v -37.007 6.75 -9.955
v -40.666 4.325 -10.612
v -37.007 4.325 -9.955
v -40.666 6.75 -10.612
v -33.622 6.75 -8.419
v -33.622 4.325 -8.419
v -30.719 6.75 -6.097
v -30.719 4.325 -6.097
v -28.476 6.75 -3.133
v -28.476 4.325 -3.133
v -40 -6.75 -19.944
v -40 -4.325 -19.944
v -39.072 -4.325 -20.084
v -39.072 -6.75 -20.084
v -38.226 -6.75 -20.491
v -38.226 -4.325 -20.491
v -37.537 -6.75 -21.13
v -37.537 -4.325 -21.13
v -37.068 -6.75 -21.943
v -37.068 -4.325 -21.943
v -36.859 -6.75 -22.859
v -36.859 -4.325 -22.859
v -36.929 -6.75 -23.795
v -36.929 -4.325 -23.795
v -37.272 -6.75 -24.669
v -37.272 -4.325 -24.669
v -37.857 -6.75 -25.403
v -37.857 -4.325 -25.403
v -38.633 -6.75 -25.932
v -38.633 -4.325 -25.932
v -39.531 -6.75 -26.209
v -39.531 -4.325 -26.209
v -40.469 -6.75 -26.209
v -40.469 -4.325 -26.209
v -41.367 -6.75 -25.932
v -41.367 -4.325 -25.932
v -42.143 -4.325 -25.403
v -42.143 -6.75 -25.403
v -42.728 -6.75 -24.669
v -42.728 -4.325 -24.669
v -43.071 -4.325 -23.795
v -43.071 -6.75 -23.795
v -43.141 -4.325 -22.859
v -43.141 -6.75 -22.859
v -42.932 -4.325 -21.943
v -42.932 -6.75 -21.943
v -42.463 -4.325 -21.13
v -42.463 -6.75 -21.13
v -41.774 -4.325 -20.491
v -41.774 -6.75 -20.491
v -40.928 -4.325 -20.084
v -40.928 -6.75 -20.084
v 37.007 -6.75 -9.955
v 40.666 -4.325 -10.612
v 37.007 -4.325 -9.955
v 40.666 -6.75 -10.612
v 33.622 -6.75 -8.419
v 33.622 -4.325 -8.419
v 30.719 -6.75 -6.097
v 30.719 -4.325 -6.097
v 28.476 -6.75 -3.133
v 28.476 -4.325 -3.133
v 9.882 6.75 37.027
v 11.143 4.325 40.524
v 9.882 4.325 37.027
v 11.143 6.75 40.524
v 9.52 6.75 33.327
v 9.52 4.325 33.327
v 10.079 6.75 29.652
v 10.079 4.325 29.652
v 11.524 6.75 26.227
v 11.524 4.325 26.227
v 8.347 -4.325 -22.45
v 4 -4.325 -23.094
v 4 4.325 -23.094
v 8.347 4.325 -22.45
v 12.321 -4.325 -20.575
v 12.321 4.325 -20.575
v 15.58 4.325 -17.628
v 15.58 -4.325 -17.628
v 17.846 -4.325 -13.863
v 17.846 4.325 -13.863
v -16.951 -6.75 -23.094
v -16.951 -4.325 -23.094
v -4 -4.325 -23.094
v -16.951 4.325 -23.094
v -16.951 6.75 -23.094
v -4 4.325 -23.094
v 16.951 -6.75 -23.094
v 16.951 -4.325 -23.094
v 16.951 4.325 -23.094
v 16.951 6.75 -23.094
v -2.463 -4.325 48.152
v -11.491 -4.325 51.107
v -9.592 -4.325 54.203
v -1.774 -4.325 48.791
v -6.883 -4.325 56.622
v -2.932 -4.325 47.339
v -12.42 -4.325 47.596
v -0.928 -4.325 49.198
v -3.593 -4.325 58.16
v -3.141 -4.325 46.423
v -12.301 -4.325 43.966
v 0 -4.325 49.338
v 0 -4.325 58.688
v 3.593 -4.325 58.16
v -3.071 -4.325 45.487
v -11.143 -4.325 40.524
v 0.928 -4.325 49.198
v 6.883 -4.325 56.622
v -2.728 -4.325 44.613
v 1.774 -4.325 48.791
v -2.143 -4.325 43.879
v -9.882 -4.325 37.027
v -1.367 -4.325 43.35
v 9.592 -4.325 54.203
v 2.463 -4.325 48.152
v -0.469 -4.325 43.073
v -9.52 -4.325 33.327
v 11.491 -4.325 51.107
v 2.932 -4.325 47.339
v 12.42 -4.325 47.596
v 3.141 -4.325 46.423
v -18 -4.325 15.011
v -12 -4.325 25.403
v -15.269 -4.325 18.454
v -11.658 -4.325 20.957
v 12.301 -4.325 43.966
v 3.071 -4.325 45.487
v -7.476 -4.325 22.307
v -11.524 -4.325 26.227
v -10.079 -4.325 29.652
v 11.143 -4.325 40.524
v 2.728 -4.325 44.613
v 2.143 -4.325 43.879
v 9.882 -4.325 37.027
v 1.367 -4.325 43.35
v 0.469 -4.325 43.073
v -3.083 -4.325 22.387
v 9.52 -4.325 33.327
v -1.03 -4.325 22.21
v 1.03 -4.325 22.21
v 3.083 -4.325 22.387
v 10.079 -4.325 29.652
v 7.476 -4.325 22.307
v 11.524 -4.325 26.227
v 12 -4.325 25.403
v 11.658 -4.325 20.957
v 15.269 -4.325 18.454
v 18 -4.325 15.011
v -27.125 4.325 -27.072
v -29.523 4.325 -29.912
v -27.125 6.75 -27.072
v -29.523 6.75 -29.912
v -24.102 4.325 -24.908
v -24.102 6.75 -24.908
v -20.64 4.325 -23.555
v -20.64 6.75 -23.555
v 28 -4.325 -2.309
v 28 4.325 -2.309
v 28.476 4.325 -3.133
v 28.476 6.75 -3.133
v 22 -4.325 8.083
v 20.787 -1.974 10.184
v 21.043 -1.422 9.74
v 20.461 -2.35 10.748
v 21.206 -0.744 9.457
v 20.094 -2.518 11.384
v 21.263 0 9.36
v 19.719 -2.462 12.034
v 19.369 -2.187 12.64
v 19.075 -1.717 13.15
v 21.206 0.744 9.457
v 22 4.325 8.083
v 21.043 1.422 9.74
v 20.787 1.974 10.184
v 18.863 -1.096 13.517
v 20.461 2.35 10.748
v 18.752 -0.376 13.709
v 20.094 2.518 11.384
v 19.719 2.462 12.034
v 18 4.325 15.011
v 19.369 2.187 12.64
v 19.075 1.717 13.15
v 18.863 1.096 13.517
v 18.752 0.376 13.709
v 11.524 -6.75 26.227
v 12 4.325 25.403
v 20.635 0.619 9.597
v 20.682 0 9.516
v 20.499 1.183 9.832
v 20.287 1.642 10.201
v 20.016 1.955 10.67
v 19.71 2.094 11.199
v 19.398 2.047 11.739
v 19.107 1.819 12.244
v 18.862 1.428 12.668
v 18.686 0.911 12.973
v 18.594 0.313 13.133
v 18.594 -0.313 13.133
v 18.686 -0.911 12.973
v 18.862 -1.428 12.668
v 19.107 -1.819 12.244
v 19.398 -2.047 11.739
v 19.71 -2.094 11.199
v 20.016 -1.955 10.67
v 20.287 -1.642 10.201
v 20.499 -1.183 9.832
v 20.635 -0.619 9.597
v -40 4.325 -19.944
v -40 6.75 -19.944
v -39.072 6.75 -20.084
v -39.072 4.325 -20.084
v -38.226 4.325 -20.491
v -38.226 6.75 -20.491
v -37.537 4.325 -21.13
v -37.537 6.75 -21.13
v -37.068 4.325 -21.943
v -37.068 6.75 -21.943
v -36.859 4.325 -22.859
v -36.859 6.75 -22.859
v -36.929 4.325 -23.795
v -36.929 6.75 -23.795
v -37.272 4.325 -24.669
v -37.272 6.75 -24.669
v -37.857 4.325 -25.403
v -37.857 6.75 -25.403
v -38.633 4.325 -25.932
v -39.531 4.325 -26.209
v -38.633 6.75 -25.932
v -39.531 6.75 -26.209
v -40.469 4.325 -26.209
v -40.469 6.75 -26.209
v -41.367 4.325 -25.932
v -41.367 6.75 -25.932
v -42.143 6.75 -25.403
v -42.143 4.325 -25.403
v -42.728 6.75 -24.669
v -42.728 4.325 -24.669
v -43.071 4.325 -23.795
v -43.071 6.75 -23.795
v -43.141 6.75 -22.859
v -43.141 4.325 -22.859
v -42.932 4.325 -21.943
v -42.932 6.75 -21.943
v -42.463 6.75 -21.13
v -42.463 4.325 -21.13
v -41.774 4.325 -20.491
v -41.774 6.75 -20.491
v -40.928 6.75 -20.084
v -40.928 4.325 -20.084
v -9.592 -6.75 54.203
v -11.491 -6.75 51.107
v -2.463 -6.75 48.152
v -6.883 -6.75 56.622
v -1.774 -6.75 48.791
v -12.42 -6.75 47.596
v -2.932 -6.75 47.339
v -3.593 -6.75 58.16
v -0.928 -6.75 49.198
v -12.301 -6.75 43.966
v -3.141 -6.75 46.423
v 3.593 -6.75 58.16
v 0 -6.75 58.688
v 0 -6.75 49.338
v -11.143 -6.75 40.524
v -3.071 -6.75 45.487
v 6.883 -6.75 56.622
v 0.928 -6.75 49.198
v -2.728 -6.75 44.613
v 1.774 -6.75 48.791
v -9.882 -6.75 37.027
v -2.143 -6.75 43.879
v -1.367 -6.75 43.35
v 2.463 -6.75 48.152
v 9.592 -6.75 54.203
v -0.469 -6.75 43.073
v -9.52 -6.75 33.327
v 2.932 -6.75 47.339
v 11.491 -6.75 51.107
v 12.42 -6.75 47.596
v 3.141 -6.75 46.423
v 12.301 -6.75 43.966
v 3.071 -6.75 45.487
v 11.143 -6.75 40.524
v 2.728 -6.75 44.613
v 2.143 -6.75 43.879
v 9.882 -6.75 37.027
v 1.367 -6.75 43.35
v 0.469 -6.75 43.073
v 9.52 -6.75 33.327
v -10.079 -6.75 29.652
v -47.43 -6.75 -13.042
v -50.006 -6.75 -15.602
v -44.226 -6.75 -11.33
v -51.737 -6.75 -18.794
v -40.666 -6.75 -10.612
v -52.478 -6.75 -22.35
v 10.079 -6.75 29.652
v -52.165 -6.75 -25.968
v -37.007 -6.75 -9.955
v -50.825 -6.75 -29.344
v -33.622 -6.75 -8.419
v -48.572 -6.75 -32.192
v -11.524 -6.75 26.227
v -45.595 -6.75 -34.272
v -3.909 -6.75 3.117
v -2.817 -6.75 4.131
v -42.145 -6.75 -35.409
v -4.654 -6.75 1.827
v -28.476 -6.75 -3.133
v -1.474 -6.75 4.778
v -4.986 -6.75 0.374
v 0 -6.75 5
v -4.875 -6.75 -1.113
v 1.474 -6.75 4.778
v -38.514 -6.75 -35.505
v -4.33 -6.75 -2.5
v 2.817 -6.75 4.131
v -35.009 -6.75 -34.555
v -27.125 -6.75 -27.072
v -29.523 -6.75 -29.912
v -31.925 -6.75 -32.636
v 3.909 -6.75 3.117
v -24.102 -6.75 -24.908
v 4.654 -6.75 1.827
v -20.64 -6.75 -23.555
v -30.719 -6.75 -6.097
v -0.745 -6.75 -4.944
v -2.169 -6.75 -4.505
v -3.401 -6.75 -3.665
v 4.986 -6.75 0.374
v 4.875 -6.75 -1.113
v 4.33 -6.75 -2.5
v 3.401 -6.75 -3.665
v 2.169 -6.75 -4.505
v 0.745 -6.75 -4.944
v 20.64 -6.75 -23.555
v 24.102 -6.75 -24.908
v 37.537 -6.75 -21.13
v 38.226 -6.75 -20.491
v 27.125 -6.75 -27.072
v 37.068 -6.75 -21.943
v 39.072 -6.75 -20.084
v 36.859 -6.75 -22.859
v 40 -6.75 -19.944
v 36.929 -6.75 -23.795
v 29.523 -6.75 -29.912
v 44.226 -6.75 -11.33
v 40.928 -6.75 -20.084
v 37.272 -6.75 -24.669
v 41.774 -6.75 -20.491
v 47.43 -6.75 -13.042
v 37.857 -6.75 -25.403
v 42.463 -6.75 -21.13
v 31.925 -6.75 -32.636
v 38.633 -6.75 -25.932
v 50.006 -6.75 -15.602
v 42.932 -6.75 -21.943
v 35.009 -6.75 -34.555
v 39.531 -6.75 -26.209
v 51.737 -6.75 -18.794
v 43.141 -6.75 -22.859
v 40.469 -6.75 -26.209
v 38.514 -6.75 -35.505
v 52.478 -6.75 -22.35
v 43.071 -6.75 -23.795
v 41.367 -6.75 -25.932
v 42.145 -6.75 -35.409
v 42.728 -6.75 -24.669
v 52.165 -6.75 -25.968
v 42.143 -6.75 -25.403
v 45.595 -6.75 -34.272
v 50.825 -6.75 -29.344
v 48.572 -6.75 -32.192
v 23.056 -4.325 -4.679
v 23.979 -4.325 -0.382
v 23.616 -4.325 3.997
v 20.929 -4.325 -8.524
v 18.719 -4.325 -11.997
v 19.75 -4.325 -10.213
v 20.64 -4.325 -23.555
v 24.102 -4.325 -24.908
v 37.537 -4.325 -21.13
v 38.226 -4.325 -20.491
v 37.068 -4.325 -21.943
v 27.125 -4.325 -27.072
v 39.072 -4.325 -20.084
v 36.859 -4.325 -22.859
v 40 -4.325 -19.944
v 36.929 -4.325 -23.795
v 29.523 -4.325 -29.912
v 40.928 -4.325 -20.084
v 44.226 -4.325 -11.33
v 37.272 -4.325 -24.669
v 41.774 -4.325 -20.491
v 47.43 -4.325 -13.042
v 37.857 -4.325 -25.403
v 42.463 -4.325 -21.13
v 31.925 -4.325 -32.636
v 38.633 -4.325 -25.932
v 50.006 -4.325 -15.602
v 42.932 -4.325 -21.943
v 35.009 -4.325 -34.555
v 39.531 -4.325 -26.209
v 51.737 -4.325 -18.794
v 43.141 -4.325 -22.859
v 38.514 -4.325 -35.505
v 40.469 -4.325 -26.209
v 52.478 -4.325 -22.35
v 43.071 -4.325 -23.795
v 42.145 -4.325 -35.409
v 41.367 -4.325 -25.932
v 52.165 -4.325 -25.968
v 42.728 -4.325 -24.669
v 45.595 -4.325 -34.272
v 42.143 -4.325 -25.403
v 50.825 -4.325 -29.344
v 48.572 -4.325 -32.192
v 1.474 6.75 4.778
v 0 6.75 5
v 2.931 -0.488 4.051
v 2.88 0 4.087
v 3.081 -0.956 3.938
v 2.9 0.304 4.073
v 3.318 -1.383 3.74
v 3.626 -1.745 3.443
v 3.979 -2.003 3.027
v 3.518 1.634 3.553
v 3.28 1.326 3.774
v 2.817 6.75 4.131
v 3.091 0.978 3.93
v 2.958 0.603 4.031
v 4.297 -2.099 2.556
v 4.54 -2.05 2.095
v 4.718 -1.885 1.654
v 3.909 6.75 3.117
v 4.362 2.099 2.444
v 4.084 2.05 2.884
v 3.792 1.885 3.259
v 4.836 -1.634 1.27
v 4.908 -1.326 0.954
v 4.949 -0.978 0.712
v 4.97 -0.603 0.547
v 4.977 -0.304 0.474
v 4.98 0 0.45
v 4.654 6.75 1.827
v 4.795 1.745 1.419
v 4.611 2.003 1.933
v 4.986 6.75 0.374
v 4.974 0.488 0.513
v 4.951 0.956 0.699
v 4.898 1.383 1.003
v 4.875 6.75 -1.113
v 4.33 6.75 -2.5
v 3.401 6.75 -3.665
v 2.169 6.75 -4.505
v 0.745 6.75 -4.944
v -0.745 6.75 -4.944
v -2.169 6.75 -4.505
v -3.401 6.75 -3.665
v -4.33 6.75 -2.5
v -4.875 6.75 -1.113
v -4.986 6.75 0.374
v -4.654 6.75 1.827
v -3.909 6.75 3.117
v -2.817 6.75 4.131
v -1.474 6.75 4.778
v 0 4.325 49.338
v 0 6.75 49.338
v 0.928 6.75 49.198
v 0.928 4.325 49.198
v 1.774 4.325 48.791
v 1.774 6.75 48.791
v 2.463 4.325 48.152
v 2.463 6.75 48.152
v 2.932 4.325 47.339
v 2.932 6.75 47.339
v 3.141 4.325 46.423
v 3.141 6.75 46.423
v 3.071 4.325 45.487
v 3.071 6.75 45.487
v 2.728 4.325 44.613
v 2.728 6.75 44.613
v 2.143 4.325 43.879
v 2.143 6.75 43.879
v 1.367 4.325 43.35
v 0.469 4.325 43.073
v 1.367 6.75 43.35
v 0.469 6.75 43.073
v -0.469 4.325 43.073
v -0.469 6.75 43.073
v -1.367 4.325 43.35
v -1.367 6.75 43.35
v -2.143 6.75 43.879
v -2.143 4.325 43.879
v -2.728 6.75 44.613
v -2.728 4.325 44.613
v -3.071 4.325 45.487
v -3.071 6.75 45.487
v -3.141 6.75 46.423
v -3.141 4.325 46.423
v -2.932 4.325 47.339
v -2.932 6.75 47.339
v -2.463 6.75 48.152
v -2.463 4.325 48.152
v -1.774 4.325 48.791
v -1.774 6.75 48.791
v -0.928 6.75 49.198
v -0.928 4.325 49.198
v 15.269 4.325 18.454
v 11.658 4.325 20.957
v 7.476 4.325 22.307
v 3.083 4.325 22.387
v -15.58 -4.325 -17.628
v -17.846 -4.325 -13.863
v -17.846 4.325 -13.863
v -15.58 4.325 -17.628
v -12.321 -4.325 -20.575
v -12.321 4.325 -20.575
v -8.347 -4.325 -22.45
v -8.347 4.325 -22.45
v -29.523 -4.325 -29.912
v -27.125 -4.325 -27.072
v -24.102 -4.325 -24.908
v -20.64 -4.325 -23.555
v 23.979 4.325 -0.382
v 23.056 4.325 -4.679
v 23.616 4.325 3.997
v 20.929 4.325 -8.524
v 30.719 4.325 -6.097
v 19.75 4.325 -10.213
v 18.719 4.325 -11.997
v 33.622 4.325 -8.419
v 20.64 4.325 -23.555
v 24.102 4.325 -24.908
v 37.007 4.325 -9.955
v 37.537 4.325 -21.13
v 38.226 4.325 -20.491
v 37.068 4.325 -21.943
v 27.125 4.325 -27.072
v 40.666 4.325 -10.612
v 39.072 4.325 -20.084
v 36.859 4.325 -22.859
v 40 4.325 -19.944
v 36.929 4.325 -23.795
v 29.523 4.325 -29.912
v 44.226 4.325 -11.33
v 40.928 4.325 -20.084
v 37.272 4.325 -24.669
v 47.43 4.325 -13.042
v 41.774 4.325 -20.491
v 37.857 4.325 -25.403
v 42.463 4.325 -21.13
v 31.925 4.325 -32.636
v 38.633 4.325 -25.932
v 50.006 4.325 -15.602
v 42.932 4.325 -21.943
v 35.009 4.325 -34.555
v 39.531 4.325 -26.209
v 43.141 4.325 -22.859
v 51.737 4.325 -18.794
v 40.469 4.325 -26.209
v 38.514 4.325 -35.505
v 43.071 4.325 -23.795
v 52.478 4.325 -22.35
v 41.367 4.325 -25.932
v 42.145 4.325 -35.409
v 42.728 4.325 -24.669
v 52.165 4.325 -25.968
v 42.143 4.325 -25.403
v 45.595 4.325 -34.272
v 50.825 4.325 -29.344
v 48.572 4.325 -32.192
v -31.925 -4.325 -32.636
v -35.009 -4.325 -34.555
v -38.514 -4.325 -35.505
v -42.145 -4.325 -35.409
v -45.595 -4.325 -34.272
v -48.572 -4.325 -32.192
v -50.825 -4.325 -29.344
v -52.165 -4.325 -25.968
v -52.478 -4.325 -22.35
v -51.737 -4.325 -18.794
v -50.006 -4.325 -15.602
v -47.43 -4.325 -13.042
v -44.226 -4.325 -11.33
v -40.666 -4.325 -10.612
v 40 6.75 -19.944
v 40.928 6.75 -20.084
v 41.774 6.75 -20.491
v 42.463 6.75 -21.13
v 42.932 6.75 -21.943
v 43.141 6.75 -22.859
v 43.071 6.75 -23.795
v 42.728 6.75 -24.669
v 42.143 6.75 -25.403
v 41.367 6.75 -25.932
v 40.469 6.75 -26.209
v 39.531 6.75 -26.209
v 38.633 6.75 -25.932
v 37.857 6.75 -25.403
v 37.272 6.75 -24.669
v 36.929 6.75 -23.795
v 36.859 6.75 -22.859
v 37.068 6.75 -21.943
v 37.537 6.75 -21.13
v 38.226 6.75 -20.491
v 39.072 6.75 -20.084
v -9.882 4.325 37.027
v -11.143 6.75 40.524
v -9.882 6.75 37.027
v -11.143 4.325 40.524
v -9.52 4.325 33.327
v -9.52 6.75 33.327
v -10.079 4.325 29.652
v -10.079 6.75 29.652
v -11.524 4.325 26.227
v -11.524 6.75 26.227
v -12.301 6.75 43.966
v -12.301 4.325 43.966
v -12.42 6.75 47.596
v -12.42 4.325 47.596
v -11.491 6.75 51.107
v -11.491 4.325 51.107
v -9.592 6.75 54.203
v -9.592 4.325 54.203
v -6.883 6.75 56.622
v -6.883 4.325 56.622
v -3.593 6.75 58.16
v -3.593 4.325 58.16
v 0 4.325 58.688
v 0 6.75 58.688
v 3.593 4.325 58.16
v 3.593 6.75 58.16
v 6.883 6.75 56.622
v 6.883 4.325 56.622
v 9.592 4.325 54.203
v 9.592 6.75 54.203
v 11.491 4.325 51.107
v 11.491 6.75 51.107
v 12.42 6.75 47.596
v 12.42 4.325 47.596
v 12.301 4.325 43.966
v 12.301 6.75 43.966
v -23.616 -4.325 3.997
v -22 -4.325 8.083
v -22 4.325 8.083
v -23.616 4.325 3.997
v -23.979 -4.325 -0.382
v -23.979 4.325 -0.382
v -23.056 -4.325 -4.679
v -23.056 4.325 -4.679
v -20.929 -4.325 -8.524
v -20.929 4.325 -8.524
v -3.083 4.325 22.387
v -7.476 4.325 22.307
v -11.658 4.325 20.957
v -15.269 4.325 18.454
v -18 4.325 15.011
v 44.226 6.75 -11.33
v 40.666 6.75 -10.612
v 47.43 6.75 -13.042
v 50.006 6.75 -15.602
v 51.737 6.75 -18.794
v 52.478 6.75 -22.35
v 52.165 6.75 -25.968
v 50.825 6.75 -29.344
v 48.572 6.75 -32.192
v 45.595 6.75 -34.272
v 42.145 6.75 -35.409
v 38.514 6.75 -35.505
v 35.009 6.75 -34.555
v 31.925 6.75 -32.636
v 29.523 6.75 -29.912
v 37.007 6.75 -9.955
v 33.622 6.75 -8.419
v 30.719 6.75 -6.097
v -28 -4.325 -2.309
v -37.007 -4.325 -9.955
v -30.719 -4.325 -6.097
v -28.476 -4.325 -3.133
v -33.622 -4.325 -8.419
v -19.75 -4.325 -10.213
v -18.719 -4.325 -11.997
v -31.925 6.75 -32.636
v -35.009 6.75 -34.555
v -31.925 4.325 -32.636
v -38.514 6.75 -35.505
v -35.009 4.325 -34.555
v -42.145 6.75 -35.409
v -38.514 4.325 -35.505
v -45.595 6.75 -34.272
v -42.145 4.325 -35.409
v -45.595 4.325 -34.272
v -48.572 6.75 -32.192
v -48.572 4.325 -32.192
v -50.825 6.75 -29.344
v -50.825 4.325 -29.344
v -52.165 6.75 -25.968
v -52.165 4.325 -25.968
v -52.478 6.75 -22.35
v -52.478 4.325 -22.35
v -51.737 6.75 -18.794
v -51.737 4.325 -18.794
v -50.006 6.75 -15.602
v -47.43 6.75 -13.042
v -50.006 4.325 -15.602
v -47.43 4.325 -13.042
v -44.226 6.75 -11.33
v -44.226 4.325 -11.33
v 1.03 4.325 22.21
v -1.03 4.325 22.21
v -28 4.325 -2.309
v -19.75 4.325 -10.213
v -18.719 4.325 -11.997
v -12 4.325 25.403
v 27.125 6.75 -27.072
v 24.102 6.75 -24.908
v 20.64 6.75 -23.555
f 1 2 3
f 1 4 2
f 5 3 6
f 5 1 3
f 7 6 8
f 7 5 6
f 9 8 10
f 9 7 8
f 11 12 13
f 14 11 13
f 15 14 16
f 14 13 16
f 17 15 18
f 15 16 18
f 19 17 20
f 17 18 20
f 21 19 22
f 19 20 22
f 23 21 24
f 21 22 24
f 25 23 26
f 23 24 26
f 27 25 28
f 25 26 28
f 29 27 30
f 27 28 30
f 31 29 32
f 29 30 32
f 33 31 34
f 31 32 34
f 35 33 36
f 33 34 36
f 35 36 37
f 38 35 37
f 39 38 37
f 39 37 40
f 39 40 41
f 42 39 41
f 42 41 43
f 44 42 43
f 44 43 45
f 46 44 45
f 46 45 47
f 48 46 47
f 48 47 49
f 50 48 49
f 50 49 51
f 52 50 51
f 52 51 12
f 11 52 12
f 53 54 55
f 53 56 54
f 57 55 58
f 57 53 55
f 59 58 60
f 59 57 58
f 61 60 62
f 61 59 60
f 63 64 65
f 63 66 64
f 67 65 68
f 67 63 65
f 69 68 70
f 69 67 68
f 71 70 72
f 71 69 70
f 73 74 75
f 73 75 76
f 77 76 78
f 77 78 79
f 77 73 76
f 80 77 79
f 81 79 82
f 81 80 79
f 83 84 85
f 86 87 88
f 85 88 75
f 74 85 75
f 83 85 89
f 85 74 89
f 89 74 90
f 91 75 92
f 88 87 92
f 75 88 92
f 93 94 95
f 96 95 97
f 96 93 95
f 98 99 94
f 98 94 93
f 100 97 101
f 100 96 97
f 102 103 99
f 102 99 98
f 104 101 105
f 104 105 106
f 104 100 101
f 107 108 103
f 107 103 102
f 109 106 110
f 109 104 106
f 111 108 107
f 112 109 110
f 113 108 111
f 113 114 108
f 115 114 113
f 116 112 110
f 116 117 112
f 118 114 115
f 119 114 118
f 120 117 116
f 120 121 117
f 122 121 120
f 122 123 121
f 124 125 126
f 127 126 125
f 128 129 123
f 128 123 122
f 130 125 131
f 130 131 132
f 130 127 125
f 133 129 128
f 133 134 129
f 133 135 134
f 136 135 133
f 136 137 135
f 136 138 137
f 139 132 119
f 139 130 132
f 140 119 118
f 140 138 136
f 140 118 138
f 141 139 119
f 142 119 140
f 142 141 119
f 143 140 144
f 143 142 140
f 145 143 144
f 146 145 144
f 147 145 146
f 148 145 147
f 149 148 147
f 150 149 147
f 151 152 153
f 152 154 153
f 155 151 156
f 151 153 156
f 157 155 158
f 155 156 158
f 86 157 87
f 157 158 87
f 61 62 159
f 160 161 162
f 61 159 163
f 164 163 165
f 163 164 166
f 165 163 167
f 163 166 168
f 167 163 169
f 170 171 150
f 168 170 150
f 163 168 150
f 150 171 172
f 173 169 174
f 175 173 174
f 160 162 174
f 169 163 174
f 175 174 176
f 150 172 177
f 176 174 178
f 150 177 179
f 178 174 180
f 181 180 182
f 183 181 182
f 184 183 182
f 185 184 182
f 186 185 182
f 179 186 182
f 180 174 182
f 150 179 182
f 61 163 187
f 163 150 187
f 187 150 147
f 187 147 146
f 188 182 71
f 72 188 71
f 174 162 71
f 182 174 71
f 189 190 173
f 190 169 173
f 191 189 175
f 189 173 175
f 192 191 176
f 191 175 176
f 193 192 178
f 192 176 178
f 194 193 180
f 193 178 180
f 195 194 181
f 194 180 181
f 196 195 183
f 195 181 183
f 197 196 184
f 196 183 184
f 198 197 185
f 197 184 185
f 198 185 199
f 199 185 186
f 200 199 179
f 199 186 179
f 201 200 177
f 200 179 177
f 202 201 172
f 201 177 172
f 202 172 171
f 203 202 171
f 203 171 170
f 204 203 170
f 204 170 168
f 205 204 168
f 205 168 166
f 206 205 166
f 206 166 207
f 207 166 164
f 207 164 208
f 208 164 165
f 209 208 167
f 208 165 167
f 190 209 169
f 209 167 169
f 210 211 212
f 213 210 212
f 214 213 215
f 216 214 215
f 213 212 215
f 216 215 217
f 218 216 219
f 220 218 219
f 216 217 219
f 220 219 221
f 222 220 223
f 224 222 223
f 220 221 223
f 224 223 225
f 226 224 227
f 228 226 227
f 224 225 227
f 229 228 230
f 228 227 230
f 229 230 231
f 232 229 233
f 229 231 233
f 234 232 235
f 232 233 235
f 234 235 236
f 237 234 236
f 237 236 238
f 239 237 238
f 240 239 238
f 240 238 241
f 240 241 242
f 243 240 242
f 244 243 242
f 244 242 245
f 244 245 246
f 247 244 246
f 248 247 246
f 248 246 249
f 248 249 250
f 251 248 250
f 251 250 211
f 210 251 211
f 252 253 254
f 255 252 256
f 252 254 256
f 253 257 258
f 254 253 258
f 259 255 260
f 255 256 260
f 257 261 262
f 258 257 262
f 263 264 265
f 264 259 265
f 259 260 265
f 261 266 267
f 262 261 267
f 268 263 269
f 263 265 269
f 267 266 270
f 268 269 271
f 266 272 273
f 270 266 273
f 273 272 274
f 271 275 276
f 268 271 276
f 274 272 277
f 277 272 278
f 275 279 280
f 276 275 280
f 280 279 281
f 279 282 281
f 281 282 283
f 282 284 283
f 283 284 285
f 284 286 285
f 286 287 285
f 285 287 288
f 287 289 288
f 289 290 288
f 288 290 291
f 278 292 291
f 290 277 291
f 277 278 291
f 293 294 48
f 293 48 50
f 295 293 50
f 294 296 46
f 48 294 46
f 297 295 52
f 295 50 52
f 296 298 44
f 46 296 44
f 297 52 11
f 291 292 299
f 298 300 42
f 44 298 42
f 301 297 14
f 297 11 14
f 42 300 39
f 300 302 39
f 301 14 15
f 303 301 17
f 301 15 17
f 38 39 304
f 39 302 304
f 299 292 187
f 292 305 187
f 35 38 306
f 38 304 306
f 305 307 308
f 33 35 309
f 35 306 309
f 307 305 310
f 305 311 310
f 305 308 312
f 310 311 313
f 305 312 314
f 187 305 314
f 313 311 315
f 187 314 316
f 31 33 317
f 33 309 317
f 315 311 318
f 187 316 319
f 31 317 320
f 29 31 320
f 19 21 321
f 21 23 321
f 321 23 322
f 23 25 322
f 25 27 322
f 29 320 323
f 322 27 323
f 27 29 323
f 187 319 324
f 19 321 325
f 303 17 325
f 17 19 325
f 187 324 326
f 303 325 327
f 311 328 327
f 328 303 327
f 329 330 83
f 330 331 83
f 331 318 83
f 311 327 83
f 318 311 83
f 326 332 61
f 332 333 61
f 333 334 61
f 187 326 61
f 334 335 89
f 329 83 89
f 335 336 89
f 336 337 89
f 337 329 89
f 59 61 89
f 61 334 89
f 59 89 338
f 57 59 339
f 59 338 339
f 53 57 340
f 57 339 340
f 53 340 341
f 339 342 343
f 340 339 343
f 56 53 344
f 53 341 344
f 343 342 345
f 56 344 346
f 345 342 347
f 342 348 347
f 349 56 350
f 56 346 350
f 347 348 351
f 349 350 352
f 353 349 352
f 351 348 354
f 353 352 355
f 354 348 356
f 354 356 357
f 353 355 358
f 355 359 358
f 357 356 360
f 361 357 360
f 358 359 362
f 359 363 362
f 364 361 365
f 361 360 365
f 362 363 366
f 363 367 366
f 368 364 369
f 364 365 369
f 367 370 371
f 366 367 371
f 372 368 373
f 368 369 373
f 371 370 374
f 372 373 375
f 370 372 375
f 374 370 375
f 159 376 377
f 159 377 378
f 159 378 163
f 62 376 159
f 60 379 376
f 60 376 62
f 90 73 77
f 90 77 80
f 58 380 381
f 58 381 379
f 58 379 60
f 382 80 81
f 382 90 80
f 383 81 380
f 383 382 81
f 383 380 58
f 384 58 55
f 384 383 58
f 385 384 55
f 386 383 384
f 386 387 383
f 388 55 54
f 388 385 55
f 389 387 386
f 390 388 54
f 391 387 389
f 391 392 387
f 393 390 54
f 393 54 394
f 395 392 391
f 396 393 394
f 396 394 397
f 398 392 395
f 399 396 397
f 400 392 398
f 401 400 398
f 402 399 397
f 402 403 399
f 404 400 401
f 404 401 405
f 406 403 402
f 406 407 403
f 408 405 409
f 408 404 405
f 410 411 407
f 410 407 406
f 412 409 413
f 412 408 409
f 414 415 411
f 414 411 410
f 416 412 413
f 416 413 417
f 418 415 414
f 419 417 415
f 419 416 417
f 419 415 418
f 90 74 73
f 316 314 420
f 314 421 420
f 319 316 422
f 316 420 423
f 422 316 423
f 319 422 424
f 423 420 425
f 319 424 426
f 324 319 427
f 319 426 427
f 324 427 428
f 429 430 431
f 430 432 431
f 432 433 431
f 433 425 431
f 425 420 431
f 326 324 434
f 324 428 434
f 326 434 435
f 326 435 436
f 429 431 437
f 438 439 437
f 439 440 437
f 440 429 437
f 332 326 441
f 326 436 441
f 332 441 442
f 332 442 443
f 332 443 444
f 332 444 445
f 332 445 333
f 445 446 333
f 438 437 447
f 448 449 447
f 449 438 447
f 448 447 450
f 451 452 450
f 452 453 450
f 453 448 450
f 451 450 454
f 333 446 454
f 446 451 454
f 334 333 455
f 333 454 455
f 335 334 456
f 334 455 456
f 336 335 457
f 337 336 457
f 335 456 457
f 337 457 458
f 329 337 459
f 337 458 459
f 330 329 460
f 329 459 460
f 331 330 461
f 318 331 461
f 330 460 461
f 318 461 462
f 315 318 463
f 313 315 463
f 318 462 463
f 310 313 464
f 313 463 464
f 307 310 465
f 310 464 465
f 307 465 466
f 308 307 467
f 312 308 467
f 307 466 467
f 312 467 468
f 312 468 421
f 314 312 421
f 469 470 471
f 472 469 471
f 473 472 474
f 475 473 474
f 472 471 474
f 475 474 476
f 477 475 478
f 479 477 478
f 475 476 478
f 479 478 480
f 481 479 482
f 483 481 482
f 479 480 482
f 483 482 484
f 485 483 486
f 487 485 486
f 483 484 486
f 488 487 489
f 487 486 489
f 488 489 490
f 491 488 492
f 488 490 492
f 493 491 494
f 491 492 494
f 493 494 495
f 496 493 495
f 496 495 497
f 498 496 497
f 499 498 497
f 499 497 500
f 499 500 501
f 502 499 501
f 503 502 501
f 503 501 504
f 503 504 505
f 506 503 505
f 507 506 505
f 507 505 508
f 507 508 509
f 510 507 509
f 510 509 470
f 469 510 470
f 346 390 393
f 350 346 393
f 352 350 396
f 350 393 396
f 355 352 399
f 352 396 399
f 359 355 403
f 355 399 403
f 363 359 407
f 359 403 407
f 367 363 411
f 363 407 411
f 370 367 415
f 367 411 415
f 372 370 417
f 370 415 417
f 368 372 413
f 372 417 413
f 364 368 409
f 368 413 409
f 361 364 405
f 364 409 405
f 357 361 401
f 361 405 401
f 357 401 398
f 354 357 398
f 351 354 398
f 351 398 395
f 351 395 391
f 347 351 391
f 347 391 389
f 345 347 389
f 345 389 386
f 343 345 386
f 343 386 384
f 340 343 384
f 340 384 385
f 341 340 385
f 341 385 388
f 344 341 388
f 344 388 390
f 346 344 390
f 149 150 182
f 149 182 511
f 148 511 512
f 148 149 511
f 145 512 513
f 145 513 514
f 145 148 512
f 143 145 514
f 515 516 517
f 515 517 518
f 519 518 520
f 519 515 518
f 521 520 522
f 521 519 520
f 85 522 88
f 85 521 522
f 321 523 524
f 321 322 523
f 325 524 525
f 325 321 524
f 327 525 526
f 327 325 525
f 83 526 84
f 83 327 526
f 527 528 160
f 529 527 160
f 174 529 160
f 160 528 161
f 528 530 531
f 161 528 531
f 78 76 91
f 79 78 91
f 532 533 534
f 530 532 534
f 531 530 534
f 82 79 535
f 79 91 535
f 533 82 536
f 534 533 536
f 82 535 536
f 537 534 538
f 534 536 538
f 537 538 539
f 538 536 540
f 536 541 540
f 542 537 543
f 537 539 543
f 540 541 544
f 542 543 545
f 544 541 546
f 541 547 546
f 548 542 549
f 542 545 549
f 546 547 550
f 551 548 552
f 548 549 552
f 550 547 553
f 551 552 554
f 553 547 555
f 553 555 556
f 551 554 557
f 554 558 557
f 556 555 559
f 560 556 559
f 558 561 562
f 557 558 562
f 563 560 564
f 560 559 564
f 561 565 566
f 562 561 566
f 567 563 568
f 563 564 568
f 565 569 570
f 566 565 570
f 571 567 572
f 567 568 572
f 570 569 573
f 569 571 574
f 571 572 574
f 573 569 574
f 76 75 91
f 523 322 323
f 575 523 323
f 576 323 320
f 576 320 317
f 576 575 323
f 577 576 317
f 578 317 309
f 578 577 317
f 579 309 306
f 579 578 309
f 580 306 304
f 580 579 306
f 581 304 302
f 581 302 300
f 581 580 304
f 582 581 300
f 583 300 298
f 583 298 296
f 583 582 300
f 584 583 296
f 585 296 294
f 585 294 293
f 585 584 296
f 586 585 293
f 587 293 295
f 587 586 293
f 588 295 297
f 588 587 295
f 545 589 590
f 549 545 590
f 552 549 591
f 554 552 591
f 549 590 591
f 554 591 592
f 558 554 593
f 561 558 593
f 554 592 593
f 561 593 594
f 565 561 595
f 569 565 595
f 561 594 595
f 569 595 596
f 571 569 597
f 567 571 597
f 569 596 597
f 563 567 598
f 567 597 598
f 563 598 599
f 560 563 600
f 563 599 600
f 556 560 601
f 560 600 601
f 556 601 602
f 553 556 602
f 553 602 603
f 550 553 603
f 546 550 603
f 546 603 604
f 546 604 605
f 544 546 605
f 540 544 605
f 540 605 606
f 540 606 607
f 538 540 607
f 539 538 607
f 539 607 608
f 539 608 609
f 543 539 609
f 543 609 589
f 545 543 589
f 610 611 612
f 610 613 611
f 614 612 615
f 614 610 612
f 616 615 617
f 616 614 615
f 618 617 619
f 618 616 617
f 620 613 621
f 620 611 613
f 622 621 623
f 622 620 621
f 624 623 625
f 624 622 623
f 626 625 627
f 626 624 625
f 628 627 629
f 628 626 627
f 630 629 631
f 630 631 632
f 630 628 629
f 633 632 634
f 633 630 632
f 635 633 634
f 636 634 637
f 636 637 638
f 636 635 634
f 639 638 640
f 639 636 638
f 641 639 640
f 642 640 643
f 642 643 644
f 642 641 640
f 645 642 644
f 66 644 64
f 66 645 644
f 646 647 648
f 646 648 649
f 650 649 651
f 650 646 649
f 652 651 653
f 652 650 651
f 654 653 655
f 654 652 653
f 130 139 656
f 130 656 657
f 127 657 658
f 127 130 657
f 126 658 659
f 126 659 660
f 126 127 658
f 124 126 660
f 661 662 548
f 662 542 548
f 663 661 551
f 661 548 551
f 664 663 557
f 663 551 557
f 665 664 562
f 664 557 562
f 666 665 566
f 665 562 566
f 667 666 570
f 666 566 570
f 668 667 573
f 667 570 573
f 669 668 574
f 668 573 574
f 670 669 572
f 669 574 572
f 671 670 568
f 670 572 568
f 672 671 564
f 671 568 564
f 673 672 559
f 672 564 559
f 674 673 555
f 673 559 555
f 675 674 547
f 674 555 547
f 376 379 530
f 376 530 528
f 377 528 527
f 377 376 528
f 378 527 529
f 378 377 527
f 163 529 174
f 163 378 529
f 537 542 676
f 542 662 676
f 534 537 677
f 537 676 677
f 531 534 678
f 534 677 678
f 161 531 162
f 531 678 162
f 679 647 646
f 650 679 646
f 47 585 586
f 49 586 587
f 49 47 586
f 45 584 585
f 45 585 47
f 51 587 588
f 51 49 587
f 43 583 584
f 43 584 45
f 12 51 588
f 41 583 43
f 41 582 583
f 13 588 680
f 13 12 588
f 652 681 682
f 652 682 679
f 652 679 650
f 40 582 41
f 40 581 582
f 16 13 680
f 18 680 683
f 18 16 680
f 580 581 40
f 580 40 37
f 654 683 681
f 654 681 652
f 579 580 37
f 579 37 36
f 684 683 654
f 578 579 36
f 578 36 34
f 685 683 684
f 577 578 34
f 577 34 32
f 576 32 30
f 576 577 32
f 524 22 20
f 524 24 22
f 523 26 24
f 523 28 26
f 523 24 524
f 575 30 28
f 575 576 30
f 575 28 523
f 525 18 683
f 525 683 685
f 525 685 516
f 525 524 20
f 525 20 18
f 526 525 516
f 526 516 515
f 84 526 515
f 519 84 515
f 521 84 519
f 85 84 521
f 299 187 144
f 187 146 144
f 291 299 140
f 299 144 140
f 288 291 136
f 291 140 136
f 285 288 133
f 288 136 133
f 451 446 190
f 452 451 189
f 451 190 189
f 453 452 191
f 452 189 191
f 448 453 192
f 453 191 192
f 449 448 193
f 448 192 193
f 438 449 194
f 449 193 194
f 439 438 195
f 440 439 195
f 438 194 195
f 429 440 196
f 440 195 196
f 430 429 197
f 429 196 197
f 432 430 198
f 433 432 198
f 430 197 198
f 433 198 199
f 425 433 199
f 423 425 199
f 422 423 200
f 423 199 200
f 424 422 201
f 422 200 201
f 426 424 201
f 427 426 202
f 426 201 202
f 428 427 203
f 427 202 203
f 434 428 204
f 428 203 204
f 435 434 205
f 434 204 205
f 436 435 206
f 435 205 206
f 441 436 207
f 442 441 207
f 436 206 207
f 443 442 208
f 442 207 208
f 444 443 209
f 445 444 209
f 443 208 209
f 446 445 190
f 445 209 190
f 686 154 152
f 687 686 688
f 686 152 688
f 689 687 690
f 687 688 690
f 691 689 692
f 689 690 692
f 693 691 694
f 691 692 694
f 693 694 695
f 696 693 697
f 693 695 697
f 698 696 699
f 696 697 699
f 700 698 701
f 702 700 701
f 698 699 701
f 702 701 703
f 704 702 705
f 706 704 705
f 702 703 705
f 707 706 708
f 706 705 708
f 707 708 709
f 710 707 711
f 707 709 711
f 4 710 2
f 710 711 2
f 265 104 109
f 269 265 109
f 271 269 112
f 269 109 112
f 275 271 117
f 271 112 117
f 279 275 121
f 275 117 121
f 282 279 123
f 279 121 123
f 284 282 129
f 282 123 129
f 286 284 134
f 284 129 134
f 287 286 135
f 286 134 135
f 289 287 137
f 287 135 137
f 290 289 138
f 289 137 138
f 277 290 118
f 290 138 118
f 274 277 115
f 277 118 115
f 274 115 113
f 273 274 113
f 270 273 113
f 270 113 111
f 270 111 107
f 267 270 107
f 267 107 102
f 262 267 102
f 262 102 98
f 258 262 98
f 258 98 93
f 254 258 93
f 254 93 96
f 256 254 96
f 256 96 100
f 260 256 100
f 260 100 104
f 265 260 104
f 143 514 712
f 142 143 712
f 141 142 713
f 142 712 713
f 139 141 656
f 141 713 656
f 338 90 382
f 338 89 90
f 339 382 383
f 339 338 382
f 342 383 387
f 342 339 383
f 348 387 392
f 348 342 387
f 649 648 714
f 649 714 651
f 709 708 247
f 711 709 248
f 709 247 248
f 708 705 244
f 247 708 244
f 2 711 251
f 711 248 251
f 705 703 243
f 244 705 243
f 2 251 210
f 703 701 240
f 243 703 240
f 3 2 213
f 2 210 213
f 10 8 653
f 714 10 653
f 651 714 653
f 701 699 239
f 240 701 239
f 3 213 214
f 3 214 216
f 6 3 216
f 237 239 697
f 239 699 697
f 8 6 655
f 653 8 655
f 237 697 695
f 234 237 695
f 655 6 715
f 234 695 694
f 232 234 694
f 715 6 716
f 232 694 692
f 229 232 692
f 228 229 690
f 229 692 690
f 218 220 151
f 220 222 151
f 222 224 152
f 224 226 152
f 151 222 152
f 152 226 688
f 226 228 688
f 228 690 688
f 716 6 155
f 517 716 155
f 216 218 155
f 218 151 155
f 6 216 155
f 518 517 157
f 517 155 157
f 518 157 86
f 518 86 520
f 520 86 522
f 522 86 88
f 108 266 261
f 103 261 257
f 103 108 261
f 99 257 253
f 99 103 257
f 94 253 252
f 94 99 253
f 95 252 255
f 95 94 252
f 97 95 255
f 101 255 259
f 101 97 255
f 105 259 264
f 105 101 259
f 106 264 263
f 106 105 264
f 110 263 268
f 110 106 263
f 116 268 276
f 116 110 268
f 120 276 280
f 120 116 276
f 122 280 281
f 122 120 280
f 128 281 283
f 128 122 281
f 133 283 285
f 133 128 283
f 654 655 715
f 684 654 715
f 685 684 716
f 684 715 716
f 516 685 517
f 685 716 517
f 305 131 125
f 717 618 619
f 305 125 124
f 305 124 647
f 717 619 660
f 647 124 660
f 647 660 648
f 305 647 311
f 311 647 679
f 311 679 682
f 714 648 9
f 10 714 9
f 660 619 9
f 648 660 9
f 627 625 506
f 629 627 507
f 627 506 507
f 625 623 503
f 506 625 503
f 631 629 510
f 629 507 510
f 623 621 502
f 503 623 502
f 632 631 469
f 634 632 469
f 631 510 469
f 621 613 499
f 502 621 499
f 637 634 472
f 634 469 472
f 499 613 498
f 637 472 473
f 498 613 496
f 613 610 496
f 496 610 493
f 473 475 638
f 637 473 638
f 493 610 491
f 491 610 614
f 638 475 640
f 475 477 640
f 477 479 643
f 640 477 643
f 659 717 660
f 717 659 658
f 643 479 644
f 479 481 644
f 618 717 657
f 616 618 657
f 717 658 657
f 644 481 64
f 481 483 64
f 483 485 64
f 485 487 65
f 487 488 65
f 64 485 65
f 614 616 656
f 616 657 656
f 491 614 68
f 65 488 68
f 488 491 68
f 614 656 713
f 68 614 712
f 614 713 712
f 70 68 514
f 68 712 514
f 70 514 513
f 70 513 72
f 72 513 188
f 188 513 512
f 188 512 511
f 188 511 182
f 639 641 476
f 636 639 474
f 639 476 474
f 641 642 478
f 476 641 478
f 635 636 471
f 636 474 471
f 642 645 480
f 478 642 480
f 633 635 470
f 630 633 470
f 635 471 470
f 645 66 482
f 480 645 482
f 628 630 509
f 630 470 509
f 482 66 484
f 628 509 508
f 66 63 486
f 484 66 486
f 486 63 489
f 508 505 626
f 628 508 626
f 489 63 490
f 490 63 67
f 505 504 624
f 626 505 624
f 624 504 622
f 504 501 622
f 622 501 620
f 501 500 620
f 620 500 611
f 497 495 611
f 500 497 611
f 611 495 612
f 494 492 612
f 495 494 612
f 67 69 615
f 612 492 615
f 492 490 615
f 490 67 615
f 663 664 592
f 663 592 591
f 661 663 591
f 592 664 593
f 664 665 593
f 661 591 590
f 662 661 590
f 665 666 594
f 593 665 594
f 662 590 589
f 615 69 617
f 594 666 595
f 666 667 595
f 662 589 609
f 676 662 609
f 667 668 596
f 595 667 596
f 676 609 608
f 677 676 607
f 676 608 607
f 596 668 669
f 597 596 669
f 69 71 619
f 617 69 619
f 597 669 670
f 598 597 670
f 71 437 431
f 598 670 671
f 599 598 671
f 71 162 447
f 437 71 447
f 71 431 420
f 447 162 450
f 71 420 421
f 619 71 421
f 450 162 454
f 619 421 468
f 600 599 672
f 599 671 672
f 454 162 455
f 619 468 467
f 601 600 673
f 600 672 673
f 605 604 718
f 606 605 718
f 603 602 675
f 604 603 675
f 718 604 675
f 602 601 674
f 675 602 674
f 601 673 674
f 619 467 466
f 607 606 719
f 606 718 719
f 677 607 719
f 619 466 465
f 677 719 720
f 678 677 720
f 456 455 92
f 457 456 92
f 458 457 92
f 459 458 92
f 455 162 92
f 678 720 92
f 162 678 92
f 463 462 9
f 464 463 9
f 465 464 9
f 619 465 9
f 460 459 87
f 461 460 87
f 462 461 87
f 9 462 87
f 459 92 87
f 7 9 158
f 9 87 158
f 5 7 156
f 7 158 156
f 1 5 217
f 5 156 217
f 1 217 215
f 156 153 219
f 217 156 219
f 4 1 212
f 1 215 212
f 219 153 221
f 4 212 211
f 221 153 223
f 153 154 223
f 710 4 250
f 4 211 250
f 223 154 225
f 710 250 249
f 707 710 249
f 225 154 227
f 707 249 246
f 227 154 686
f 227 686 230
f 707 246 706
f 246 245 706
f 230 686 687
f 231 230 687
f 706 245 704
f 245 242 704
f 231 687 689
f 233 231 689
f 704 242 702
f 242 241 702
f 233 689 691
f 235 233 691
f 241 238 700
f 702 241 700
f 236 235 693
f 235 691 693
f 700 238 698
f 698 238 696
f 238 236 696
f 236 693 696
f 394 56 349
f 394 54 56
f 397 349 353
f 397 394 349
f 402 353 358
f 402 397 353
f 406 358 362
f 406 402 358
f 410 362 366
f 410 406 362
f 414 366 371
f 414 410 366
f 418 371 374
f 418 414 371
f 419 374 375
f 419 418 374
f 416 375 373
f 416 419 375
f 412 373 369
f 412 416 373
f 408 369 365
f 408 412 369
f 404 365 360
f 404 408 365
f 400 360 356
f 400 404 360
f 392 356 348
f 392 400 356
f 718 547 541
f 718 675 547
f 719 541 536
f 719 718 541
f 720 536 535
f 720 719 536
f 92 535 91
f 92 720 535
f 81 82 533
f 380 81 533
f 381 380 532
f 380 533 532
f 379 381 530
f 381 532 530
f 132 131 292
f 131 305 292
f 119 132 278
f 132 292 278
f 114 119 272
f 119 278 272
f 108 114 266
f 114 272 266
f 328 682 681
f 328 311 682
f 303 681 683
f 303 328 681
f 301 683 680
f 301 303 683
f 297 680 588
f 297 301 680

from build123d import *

# Parameters (mm, degrees)
ESQUISSE1_R             = 12.5
ESQUISSE1_R_2           = 5
BOSS_EXTRU_1_DEPTH      = 6.75
ESQUISSE7_R             = 24
ENL_V_MAT_EXTRU_1_DEPTH = 4.325
CONG_6_START            = -4.325
CONG_6_DEPTH            = 8.65
CONG_7_R                = 15
ESQUISSE25_R            = 3.15
ENL_V_MAT_EXTRU_2_DEPTH = 80.892326756


with BuildPart() as part:
    # Esquisse1 → Boss.-Extru.1 (new, symmetric)
    # profile 1 of 16: a face of its own
    with BuildSketch(Plane(origin=(0, 0, 0), x_dir=(1, 0, 0), z_dir=(0, 1, 0))):
        with Locations((-40, 23.094010768)):
            Circle(ESQUISSE1_R)
    # profile 2 of 16: a face of its own
    with BuildSketch(Plane(origin=(0, 0, 0), x_dir=(1, 0, 0), z_dir=(0, 1, 0))):
        with Locations((0, -46.188021535)):
            Circle(ESQUISSE1_R)
    # profile 3 of 16: a face of its own
    with BuildSketch(Plane(origin=(0, 0, 0), x_dir=(1, 0, 0), z_dir=(0, 1, 0))):
        with Locations((40, 23.094010768)):
            Circle(ESQUISSE1_R)
    # profile 4 of 16: a face of its own
    with BuildSketch(Plane(origin=(0, 0, 0), x_dir=(1, 0, 0), z_dir=(0, 1, 0))):
        Polygon((0, -46.188021535), (-40, 23.094010768), (40, 23.094010768), align=None)
        with Locations(Location((0, 0, 0), (0, 0, 270))):
            Circle(ESQUISSE1_R_2, mode=Mode.SUBTRACT)
    # profile 5 of 16: a face of its own
    with BuildSketch(Plane(origin=(0, 0, 0), x_dir=(1, 0, 0), z_dir=(0, 1, 0))):
        with BuildLine():
            ThreePointArc((-33.75, 12.26869322), (-29.174682453, 16.844010768), (-27.5, 23.094010768))
            Line((-27.5, 23.094010768), (-40, 23.094010768))
            Line((-40, 23.094010768), (-33.75, 12.26869322))
        make_face()
    # profile 6 of 16: a face of its own
    with BuildSketch(Plane(origin=(0, 0, 0), x_dir=(1, 0, 0), z_dir=(0, 1, 0))):
        with BuildLine():
            Line((-40, 23.094010768), (-27.5, 23.094010768))
            ThreePointArc((-27.5, 23.094010768), (-50.825317547, 29.344010768), (-33.75, 12.26869322))
            Line((-33.75, 12.26869322), (-40, 23.094010768))
        make_face()
    # profile 7 of 16: a face of its own
    with BuildSketch(Plane(origin=(0, 0, 0), x_dir=(1, 0, 0), z_dir=(0, 1, 0))):
        with BuildLine():
            Line((27.5, 23.094010768), (40, 23.094010768))
            Line((40, 23.094010768), (33.75, 12.26869322))
            ThreePointArc((33.75, 12.26869322), (46.25, 12.26869322), (52.5, 23.094010768))
            ThreePointArc((52.5, 23.094010768), (40, 35.594010768), (27.5, 23.094010768))
        make_face()
    # profile 8 of 16: a face of its own
    with BuildSketch(Plane(origin=(0, 0, 0), x_dir=(1, 0, 0), z_dir=(0, 1, 0))):
        with BuildLine():
            Line((33.75, 12.26869322), (40, 23.094010768))
            Line((40, 23.094010768), (27.5, 23.094010768))
            ThreePointArc((27.5, 23.094010768), (29.174682453, 16.844010768), (33.75, 12.26869322))
        make_face()
    # profile 9 of 16: a face of its own
    with BuildSketch(Plane(origin=(0, 0, 0), x_dir=(1, 0, 0), z_dir=(0, 1, 0))):
        with BuildLine():
            Line((27.5, 23.094010768), (40, 23.094010768))
            Line((40, 23.094010768), (33.75, 12.26869322))
            ThreePointArc((33.75, 12.26869322), (46.25, 12.26869322), (52.5, 23.094010768))
            ThreePointArc((52.5, 23.094010768), (40, 35.594010768), (27.5, 23.094010768))
        make_face()
    # profile 10 of 16: a face of its own
    with BuildSketch(Plane(origin=(0, 0, 0), x_dir=(1, 0, 0), z_dir=(0, 1, 0))):
        with BuildLine():
            Line((33.75, 12.26869322), (40, 23.094010768))
            Line((40, 23.094010768), (27.5, 23.094010768))
            ThreePointArc((27.5, 23.094010768), (29.174682453, 16.844010768), (33.75, 12.26869322))
        make_face()
    # profile 11 of 16: a face of its own
    with BuildSketch(Plane(origin=(0, 0, 0), x_dir=(1, 0, 0), z_dir=(0, 1, 0))):
        with BuildLine():
            ThreePointArc((-33.75, 12.26869322), (-29.174682453, 16.844010768), (-27.5, 23.094010768))
            Line((-27.5, 23.094010768), (-40, 23.094010768))
            Line((-40, 23.094010768), (-33.75, 12.26869322))
        make_face()
    # profile 12 of 16: a face of its own
    with BuildSketch(Plane(origin=(0, 0, 0), x_dir=(1, 0, 0), z_dir=(0, 1, 0))):
        with BuildLine():
            Line((-40, 23.094010768), (-27.5, 23.094010768))
            ThreePointArc((-27.5, 23.094010768), (-50.825317547, 29.344010768), (-33.75, 12.26869322))
            Line((-33.75, 12.26869322), (-40, 23.094010768))
        make_face()
    # profile 13 of 16: a face of its own
    with BuildSketch(Plane(origin=(0, 0, 0), x_dir=(1, 0, 0), z_dir=(0, 1, 0))):
        with BuildLine():
            ThreePointArc((12.5, -46.188021535), (10.825317547, -39.938021535), (6.25, -35.362703988))
            Line((6.25, -35.362703988), (0, -46.188021535))
            Line((0, -46.188021535), (-6.25, -35.362703988))
            ThreePointArc((-6.25, -35.362703988), (-6.25, -57.013339082), (12.5, -46.188021535))
        make_face()
    # profile 14 of 16: a face of its own
    with BuildSketch(Plane(origin=(0, 0, 0), x_dir=(1, 0, 0), z_dir=(0, 1, 0))):
        with BuildLine():
            Line((0, -46.188021535), (6.25, -35.362703988))
            ThreePointArc((6.25, -35.362703988), (0, -33.688021535), (-6.25, -35.362703988))
            Line((-6.25, -35.362703988), (0, -46.188021535))
        make_face()
    # profile 15 of 16: a face of its own
    with BuildSketch(Plane(origin=(0, 0, 0), x_dir=(1, 0, 0), z_dir=(0, 1, 0))):
        with BuildLine():
            ThreePointArc((12.5, -46.188021535), (10.825317547, -39.938021535), (6.25, -35.362703988))
            Line((6.25, -35.362703988), (0, -46.188021535))
            Line((0, -46.188021535), (-6.25, -35.362703988))
            ThreePointArc((-6.25, -35.362703988), (-6.25, -57.013339082), (12.5, -46.188021535))
        make_face()
    # profile 16 of 16: a face of its own
    with BuildSketch(Plane(origin=(0, 0, 0), x_dir=(1, 0, 0), z_dir=(0, 1, 0))):
        with BuildLine():
            Line((0, -46.188021535), (6.25, -35.362703988))
            ThreePointArc((6.25, -35.362703988), (0, -33.688021535), (-6.25, -35.362703988))
            Line((-6.25, -35.362703988), (0, -46.188021535))
        make_face()
    extrude(amount=BOSS_EXTRU_1_DEPTH, both=True)

    # Esquisse7 → Enlèv. mat.-Extru.1 (cut, symmetric)
    with BuildSketch(Plane(origin=(0, 0, 0), x_dir=(1, 0, 0), z_dir=(0, 1, 0))):
        with Locations((-40, 23.094010768)):
            Circle(ESQUISSE7_R)
        with Locations((0, -46.188021535)):
            Circle(ESQUISSE7_R)
        with Locations((40, 23.094010768)):
            Circle(ESQUISSE7_R)
    extrude(amount=ENL_V_MAT_EXTRU_1_DEPTH, both=True, mode=Mode.SUBTRACT)

    # Congé6: read off the stored shape, not the designer's step
    # Congé6 outline → Congé6 (cut)
    with BuildSketch(Plane(origin=(0, 0, 0), x_dir=(1, 0, 0), z_dir=(0, 1, 0)).offset(CONG_6_START)):
        with BuildLine():
            ThreePointArc((4, 23.094010768), (12.320502943, 20.574765183), (17.846153846, 13.863241537))
            ThreePointArc((17.846153846, 13.863241537), (16.466063783, 18.387223525), (16, 23.094010768))
            Line((16, 23.094010768), (4, 23.094010768))
        make_face()
        with BuildLine():
            ThreePointArc((28, 2.309401077), (24.156834569, 5.066417775), (20.928996273, 8.523601822))
            ThreePointArc((20.928996273, 8.523601822), (23.978520797, 0.382485945), (22, -8.082903769))
            Line((22, -8.082903769), (28, 2.309401077))
        make_face()
        with BuildLine():
            ThreePointArc((-17.846153846, 13.863241537), (-12.320502943, 20.574765183), (-4, 23.094010768))
            Line((-4, 23.094010768), (-16, 23.094010768))
            ThreePointArc((-16, 23.094010768), (-16.466063783, 18.387223525), (-17.846153846, 13.863241537))
        make_face()
        with BuildLine():
            Line((12, -25.403411844), (18, -15.011106999))
            ThreePointArc((18, -15.011106999), (11.658017854, -20.957251128), (3.082842427, -22.386843359))
            ThreePointArc((3.082842427, -22.386843359), (7.690770786, -23.453641299), (12, -25.403411844))
        make_face()
        with BuildLine():
            ThreePointArc((-22, -8.082903769), (-23.978520797, 0.382485945), (-20.928996273, 8.523601822))
            ThreePointArc((-20.928996273, 8.523601822), (-24.156834569, 5.066417775), (-28, 2.309401077))
            Line((-28, 2.309401077), (-22, -8.082903769))
        make_face()
        with BuildLine():
            ThreePointArc((-12, -25.403411844), (-7.690770786, -23.453641299), (-3.082842427, -22.386843359))
            ThreePointArc((-3.082842427, -22.386843359), (-11.658017854, -20.957251128), (-18, -15.011106999))
            Line((-18, -15.011106999), (-12, -25.403411844))
        make_face()
    extrude(amount=CONG_6_DEPTH, mode=Mode.SUBTRACT)

    # Trou taraudé M51: read off the stored shape, not the designer's step
    # Trou taraudé M51 outline → Trou taraudé M51 (revolve, cut)
    with BuildSketch(Plane(origin=(0, 0, 0), x_dir=(0.5000000000000003, 0, -0.8660254037844385), z_dir=(0, -1, 0))):
        Polygon((0, 4.537411543), (2.1, 4.537411543), (2.1, 22.669010768), (2.525, 23.094010768), (0, 23.094010768), align=None)
    revolve(axis=Axis((0, 0, 0), (0.8660254037844385, 0, 0.5000000000000003)), mode=Mode.SUBTRACT)

    # Congé7
    cong_7_edges = [part.edges().sort_by_distance(p)[0] for p in [
        (-27.5, 5.5375, -23.094010768),
        (27.5, 5.5375, -23.094010768),
        (33.75, 5.5375, -12.26869322),
        (6.25, 5.5375, 35.362703988),
        (-6.25, 5.5375, 35.362703988),
        (-33.75, 5.5375, -12.26869322),
        (-27.5, -5.5375, -23.094010768),
        (27.5, -5.5375, -23.094010768),
        (33.75, -5.5375, -12.26869322),
        (6.25, -5.5375, 35.362703988),
        (-6.25, -5.5375, 35.362703988),
        (-33.75, -5.5375, -12.26869322),
    ]]
    fillet(cong_7_edges, radius=CONG_7_R)

    # Esquisse25 → Enlèv. mat.-Extru.2 (cut, through all)
    with BuildSketch(Plane(origin=(0, 6.75, 0), x_dir=(1, 0, 0), z_dir=(0, 1, 0))):
        with Locations(Location((-40, 23.094010768, 0), (0, 0, 270))):
            Circle(ESQUISSE25_R)
        with Locations(Location((40, 23.094010768, 0), (0, 0, 270))):
            Circle(ESQUISSE25_R)
        with Locations(Location((0, -46.188021535, 0), (0, 0, 270))):
            Circle(ESQUISSE25_R)
    extrude(amount=-ENL_V_MAT_EXTRU_2_DEPTH, mode=Mode.SUBTRACT)


solid = part.part
